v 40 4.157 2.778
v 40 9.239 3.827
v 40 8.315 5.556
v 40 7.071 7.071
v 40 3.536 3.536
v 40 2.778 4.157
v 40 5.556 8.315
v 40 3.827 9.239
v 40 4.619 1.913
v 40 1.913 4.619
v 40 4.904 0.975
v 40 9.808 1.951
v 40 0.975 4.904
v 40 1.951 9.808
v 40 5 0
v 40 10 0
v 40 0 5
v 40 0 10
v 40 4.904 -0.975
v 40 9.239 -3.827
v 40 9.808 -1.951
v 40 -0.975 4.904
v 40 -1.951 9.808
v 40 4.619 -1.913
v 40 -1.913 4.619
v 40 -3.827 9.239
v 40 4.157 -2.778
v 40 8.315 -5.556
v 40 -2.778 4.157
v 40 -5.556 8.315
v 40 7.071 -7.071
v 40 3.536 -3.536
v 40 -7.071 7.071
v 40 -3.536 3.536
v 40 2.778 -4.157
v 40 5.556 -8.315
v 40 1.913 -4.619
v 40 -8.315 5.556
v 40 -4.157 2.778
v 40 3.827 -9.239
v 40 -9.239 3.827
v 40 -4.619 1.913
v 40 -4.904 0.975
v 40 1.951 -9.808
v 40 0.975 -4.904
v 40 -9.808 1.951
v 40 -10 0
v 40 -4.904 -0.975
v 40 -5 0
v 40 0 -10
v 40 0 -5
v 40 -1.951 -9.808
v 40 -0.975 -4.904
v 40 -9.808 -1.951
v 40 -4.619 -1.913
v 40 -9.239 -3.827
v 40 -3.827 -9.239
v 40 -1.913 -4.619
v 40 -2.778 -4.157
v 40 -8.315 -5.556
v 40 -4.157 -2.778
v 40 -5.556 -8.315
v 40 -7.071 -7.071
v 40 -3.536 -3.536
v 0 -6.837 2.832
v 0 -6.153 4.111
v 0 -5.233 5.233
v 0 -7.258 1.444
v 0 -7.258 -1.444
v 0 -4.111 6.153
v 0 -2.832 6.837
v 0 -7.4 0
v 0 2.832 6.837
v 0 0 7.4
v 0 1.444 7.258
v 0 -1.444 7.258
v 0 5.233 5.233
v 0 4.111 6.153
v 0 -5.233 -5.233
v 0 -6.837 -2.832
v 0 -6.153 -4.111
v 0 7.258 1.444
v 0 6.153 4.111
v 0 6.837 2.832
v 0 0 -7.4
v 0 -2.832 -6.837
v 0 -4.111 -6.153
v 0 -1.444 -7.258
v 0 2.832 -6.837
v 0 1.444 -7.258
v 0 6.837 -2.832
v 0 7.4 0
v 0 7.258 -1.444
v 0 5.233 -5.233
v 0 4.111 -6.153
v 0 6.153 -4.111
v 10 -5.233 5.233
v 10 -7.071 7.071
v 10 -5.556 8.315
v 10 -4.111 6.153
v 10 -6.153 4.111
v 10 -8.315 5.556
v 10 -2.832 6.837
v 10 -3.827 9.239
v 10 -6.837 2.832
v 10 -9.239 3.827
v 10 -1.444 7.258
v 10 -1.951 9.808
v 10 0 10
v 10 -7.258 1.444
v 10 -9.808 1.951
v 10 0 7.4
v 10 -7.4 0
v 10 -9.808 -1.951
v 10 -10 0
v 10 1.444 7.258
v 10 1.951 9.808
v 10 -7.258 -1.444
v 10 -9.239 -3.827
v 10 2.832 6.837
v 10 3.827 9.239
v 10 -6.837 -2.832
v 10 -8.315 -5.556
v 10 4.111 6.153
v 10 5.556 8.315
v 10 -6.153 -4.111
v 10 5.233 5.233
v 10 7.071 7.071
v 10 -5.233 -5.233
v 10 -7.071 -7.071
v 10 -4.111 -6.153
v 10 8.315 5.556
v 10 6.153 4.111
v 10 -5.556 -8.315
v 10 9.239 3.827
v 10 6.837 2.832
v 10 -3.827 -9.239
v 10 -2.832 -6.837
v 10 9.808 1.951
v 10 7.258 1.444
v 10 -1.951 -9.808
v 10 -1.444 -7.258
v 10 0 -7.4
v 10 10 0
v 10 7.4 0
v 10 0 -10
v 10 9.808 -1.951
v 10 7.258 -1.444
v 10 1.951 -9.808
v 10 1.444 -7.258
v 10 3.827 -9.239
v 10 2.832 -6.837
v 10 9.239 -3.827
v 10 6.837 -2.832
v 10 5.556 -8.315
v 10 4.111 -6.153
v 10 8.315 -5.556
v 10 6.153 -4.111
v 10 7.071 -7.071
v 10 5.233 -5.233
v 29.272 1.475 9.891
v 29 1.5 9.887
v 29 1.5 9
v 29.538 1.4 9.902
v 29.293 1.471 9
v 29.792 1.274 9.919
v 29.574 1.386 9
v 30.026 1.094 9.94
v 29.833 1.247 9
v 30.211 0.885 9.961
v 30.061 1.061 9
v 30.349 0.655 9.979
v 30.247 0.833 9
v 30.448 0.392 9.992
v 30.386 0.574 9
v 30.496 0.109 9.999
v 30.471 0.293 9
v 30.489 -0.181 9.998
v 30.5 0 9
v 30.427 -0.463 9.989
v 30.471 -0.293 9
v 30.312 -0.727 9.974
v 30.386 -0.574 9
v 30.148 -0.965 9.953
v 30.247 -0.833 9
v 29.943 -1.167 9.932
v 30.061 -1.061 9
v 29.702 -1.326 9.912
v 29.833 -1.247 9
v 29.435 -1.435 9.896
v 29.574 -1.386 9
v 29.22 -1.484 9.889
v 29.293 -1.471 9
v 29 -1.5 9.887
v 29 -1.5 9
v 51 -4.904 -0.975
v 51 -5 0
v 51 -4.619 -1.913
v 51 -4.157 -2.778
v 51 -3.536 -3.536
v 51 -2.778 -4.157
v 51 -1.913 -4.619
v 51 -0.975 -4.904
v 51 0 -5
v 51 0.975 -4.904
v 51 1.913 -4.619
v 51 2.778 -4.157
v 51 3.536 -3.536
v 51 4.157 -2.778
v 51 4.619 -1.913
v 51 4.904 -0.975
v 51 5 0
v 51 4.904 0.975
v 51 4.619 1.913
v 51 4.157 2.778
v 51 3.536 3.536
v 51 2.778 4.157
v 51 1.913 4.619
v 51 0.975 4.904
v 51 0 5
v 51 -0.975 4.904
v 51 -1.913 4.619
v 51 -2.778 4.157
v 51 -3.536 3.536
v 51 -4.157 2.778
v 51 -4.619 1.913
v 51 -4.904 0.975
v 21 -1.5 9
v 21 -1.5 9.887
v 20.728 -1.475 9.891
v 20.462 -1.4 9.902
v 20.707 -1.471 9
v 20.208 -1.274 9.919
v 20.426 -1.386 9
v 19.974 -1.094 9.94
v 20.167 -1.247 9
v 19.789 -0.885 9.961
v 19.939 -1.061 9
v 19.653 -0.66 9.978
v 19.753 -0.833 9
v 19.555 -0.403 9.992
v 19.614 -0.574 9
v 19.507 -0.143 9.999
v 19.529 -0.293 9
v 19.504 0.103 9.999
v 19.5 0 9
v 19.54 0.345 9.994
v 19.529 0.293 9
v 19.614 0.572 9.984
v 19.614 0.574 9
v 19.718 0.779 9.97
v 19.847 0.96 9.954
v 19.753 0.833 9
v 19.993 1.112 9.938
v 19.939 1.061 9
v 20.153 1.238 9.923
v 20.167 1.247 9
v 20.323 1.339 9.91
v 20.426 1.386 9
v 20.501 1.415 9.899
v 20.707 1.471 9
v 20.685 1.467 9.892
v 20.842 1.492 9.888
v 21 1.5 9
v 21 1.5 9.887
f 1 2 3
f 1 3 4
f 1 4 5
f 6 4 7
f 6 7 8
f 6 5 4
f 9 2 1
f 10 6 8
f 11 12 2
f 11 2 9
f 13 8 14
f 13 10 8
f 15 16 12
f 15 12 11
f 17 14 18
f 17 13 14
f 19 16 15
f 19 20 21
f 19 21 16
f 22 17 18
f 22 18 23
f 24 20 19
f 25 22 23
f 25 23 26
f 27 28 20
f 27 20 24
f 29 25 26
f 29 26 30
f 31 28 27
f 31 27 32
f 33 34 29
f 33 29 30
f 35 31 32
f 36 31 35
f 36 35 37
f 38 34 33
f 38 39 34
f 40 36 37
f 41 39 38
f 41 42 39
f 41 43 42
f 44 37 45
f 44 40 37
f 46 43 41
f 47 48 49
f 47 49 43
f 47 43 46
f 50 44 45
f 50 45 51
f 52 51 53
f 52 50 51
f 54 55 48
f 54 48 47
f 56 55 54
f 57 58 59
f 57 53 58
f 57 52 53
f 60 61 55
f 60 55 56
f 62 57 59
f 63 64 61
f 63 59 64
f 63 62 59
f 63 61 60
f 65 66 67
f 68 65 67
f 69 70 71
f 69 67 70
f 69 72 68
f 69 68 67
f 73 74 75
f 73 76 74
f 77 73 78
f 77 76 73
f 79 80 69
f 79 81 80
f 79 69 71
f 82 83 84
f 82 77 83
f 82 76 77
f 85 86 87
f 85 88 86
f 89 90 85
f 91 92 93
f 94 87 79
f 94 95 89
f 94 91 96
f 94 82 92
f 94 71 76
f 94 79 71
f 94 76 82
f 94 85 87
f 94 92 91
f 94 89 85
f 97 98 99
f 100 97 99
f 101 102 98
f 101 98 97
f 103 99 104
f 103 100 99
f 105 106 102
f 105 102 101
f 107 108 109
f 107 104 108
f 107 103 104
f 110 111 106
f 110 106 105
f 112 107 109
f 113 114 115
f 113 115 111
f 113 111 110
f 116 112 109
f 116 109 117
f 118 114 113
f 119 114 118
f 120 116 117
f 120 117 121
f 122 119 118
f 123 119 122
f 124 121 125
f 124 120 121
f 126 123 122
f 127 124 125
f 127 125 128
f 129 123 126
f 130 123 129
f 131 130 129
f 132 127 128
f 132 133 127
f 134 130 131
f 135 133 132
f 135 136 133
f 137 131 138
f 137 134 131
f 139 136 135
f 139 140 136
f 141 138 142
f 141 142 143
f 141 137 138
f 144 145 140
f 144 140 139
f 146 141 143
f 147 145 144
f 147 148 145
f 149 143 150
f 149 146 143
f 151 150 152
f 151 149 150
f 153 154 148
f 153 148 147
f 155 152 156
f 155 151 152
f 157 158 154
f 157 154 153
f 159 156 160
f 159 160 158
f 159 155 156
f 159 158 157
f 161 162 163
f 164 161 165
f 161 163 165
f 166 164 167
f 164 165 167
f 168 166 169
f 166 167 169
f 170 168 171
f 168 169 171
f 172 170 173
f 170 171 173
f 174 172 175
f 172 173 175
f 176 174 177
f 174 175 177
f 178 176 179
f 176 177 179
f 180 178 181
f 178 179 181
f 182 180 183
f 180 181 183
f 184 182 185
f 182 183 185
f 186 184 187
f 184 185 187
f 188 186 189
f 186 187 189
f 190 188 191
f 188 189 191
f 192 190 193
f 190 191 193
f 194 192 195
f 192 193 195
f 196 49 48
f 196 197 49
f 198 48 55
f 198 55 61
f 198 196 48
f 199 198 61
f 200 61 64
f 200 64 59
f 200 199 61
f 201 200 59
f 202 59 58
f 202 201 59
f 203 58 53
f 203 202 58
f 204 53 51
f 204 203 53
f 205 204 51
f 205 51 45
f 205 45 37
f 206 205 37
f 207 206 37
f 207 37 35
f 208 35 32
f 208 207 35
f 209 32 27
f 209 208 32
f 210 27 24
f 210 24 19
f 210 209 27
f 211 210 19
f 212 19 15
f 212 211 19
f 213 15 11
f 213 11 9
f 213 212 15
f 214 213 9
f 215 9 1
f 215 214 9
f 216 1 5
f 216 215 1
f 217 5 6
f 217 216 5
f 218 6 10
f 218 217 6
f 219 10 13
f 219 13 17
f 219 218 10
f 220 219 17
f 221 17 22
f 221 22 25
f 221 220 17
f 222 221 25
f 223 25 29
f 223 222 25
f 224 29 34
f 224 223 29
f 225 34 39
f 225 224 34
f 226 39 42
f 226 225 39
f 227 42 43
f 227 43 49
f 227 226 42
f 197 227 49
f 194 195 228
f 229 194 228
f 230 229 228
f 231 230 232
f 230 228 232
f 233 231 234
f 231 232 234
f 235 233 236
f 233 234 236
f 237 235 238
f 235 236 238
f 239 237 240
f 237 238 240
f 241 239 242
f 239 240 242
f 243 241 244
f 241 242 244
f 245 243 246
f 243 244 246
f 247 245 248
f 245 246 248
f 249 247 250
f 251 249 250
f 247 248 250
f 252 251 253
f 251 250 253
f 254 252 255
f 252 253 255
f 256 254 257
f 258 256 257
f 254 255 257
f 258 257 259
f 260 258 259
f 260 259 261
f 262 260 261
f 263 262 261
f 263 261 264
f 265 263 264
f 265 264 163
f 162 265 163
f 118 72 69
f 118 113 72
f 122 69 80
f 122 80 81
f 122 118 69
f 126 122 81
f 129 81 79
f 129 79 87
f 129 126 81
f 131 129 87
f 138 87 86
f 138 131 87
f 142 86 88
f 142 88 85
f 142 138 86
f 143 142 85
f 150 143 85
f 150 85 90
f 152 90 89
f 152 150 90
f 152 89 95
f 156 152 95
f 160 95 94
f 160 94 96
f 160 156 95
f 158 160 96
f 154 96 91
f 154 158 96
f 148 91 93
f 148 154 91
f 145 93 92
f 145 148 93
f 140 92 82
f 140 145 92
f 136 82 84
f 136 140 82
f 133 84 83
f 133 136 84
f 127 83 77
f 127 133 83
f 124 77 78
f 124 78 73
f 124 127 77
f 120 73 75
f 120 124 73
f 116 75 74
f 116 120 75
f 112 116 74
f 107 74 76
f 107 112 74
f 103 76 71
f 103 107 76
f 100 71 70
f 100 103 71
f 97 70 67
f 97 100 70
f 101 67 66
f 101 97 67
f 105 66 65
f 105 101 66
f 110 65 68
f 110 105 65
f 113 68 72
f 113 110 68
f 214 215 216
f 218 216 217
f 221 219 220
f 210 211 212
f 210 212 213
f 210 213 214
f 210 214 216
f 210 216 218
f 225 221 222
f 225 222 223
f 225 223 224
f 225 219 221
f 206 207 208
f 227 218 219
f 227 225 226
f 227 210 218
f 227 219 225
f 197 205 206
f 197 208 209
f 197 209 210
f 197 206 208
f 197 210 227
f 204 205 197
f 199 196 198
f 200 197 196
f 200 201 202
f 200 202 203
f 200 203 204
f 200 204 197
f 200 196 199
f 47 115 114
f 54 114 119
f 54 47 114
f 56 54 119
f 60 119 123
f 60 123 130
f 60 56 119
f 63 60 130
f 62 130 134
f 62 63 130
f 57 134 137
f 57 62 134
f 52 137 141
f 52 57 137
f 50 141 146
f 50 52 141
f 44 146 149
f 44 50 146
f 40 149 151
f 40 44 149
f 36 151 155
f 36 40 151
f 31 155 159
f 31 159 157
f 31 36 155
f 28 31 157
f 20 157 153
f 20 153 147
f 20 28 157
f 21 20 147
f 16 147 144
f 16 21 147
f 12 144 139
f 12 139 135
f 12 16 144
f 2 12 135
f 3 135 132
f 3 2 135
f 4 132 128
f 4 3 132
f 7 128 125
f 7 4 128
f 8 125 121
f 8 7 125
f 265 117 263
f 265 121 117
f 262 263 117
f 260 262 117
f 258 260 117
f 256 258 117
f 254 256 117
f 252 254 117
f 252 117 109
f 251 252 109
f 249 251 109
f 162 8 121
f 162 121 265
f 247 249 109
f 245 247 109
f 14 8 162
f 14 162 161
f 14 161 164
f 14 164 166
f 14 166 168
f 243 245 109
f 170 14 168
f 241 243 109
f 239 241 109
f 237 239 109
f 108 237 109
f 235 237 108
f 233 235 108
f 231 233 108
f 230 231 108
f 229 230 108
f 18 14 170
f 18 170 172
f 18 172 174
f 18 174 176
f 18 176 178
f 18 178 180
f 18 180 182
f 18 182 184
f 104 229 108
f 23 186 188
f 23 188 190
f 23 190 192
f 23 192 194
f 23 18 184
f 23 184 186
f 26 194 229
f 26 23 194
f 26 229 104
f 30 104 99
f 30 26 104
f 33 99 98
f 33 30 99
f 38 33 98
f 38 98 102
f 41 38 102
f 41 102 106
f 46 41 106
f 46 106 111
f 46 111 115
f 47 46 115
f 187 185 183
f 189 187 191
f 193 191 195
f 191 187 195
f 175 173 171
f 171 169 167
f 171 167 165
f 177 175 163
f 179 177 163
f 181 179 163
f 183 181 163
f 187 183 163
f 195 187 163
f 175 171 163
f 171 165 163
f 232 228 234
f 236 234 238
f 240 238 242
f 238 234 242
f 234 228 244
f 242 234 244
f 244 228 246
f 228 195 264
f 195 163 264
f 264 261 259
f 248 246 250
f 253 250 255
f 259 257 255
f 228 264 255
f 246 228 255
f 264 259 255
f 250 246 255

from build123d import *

# Parameters (mm, degrees)
CUT_EXTRUDE1_START = 9
CUT_EXTRUDE1_DEPTH = 10


with BuildPart() as part:
    # Sketch1 → Revolve1 (revolve)
    with BuildSketch(Plane.XY, mode=Mode.PRIVATE) as revolve1_sk:
        Polygon((0, 0), (0, 7.4), (10, 7.4), (10, 10), (40, 10), (40, 5), (51, 5), (51, 0), align=None)
    revolve(revolve1_sk.sketch.rotate(Axis((0, 0, 0), (1, 0, 0)), 180), axis=Axis((0, 0, 0), (1, 0, 0)))

    # Sketch2 → Cut-Extrude1 (cut)
    with BuildSketch(Plane.XY.offset(CUT_EXTRUDE1_START)):
        with BuildLine():
            Line((21, 1.5), (29, 1.5))
            ThreePointArc((29, 1.5), (30.5, 0), (29, -1.5))
            Line((29, -1.5), (21, -1.5))
            ThreePointArc((21, -1.5), (19.5, 0), (21, 1.5))
        make_face()
    extrude(amount=CUT_EXTRUDE1_DEPTH, mode=Mode.SUBTRACT)


solid = part.part
